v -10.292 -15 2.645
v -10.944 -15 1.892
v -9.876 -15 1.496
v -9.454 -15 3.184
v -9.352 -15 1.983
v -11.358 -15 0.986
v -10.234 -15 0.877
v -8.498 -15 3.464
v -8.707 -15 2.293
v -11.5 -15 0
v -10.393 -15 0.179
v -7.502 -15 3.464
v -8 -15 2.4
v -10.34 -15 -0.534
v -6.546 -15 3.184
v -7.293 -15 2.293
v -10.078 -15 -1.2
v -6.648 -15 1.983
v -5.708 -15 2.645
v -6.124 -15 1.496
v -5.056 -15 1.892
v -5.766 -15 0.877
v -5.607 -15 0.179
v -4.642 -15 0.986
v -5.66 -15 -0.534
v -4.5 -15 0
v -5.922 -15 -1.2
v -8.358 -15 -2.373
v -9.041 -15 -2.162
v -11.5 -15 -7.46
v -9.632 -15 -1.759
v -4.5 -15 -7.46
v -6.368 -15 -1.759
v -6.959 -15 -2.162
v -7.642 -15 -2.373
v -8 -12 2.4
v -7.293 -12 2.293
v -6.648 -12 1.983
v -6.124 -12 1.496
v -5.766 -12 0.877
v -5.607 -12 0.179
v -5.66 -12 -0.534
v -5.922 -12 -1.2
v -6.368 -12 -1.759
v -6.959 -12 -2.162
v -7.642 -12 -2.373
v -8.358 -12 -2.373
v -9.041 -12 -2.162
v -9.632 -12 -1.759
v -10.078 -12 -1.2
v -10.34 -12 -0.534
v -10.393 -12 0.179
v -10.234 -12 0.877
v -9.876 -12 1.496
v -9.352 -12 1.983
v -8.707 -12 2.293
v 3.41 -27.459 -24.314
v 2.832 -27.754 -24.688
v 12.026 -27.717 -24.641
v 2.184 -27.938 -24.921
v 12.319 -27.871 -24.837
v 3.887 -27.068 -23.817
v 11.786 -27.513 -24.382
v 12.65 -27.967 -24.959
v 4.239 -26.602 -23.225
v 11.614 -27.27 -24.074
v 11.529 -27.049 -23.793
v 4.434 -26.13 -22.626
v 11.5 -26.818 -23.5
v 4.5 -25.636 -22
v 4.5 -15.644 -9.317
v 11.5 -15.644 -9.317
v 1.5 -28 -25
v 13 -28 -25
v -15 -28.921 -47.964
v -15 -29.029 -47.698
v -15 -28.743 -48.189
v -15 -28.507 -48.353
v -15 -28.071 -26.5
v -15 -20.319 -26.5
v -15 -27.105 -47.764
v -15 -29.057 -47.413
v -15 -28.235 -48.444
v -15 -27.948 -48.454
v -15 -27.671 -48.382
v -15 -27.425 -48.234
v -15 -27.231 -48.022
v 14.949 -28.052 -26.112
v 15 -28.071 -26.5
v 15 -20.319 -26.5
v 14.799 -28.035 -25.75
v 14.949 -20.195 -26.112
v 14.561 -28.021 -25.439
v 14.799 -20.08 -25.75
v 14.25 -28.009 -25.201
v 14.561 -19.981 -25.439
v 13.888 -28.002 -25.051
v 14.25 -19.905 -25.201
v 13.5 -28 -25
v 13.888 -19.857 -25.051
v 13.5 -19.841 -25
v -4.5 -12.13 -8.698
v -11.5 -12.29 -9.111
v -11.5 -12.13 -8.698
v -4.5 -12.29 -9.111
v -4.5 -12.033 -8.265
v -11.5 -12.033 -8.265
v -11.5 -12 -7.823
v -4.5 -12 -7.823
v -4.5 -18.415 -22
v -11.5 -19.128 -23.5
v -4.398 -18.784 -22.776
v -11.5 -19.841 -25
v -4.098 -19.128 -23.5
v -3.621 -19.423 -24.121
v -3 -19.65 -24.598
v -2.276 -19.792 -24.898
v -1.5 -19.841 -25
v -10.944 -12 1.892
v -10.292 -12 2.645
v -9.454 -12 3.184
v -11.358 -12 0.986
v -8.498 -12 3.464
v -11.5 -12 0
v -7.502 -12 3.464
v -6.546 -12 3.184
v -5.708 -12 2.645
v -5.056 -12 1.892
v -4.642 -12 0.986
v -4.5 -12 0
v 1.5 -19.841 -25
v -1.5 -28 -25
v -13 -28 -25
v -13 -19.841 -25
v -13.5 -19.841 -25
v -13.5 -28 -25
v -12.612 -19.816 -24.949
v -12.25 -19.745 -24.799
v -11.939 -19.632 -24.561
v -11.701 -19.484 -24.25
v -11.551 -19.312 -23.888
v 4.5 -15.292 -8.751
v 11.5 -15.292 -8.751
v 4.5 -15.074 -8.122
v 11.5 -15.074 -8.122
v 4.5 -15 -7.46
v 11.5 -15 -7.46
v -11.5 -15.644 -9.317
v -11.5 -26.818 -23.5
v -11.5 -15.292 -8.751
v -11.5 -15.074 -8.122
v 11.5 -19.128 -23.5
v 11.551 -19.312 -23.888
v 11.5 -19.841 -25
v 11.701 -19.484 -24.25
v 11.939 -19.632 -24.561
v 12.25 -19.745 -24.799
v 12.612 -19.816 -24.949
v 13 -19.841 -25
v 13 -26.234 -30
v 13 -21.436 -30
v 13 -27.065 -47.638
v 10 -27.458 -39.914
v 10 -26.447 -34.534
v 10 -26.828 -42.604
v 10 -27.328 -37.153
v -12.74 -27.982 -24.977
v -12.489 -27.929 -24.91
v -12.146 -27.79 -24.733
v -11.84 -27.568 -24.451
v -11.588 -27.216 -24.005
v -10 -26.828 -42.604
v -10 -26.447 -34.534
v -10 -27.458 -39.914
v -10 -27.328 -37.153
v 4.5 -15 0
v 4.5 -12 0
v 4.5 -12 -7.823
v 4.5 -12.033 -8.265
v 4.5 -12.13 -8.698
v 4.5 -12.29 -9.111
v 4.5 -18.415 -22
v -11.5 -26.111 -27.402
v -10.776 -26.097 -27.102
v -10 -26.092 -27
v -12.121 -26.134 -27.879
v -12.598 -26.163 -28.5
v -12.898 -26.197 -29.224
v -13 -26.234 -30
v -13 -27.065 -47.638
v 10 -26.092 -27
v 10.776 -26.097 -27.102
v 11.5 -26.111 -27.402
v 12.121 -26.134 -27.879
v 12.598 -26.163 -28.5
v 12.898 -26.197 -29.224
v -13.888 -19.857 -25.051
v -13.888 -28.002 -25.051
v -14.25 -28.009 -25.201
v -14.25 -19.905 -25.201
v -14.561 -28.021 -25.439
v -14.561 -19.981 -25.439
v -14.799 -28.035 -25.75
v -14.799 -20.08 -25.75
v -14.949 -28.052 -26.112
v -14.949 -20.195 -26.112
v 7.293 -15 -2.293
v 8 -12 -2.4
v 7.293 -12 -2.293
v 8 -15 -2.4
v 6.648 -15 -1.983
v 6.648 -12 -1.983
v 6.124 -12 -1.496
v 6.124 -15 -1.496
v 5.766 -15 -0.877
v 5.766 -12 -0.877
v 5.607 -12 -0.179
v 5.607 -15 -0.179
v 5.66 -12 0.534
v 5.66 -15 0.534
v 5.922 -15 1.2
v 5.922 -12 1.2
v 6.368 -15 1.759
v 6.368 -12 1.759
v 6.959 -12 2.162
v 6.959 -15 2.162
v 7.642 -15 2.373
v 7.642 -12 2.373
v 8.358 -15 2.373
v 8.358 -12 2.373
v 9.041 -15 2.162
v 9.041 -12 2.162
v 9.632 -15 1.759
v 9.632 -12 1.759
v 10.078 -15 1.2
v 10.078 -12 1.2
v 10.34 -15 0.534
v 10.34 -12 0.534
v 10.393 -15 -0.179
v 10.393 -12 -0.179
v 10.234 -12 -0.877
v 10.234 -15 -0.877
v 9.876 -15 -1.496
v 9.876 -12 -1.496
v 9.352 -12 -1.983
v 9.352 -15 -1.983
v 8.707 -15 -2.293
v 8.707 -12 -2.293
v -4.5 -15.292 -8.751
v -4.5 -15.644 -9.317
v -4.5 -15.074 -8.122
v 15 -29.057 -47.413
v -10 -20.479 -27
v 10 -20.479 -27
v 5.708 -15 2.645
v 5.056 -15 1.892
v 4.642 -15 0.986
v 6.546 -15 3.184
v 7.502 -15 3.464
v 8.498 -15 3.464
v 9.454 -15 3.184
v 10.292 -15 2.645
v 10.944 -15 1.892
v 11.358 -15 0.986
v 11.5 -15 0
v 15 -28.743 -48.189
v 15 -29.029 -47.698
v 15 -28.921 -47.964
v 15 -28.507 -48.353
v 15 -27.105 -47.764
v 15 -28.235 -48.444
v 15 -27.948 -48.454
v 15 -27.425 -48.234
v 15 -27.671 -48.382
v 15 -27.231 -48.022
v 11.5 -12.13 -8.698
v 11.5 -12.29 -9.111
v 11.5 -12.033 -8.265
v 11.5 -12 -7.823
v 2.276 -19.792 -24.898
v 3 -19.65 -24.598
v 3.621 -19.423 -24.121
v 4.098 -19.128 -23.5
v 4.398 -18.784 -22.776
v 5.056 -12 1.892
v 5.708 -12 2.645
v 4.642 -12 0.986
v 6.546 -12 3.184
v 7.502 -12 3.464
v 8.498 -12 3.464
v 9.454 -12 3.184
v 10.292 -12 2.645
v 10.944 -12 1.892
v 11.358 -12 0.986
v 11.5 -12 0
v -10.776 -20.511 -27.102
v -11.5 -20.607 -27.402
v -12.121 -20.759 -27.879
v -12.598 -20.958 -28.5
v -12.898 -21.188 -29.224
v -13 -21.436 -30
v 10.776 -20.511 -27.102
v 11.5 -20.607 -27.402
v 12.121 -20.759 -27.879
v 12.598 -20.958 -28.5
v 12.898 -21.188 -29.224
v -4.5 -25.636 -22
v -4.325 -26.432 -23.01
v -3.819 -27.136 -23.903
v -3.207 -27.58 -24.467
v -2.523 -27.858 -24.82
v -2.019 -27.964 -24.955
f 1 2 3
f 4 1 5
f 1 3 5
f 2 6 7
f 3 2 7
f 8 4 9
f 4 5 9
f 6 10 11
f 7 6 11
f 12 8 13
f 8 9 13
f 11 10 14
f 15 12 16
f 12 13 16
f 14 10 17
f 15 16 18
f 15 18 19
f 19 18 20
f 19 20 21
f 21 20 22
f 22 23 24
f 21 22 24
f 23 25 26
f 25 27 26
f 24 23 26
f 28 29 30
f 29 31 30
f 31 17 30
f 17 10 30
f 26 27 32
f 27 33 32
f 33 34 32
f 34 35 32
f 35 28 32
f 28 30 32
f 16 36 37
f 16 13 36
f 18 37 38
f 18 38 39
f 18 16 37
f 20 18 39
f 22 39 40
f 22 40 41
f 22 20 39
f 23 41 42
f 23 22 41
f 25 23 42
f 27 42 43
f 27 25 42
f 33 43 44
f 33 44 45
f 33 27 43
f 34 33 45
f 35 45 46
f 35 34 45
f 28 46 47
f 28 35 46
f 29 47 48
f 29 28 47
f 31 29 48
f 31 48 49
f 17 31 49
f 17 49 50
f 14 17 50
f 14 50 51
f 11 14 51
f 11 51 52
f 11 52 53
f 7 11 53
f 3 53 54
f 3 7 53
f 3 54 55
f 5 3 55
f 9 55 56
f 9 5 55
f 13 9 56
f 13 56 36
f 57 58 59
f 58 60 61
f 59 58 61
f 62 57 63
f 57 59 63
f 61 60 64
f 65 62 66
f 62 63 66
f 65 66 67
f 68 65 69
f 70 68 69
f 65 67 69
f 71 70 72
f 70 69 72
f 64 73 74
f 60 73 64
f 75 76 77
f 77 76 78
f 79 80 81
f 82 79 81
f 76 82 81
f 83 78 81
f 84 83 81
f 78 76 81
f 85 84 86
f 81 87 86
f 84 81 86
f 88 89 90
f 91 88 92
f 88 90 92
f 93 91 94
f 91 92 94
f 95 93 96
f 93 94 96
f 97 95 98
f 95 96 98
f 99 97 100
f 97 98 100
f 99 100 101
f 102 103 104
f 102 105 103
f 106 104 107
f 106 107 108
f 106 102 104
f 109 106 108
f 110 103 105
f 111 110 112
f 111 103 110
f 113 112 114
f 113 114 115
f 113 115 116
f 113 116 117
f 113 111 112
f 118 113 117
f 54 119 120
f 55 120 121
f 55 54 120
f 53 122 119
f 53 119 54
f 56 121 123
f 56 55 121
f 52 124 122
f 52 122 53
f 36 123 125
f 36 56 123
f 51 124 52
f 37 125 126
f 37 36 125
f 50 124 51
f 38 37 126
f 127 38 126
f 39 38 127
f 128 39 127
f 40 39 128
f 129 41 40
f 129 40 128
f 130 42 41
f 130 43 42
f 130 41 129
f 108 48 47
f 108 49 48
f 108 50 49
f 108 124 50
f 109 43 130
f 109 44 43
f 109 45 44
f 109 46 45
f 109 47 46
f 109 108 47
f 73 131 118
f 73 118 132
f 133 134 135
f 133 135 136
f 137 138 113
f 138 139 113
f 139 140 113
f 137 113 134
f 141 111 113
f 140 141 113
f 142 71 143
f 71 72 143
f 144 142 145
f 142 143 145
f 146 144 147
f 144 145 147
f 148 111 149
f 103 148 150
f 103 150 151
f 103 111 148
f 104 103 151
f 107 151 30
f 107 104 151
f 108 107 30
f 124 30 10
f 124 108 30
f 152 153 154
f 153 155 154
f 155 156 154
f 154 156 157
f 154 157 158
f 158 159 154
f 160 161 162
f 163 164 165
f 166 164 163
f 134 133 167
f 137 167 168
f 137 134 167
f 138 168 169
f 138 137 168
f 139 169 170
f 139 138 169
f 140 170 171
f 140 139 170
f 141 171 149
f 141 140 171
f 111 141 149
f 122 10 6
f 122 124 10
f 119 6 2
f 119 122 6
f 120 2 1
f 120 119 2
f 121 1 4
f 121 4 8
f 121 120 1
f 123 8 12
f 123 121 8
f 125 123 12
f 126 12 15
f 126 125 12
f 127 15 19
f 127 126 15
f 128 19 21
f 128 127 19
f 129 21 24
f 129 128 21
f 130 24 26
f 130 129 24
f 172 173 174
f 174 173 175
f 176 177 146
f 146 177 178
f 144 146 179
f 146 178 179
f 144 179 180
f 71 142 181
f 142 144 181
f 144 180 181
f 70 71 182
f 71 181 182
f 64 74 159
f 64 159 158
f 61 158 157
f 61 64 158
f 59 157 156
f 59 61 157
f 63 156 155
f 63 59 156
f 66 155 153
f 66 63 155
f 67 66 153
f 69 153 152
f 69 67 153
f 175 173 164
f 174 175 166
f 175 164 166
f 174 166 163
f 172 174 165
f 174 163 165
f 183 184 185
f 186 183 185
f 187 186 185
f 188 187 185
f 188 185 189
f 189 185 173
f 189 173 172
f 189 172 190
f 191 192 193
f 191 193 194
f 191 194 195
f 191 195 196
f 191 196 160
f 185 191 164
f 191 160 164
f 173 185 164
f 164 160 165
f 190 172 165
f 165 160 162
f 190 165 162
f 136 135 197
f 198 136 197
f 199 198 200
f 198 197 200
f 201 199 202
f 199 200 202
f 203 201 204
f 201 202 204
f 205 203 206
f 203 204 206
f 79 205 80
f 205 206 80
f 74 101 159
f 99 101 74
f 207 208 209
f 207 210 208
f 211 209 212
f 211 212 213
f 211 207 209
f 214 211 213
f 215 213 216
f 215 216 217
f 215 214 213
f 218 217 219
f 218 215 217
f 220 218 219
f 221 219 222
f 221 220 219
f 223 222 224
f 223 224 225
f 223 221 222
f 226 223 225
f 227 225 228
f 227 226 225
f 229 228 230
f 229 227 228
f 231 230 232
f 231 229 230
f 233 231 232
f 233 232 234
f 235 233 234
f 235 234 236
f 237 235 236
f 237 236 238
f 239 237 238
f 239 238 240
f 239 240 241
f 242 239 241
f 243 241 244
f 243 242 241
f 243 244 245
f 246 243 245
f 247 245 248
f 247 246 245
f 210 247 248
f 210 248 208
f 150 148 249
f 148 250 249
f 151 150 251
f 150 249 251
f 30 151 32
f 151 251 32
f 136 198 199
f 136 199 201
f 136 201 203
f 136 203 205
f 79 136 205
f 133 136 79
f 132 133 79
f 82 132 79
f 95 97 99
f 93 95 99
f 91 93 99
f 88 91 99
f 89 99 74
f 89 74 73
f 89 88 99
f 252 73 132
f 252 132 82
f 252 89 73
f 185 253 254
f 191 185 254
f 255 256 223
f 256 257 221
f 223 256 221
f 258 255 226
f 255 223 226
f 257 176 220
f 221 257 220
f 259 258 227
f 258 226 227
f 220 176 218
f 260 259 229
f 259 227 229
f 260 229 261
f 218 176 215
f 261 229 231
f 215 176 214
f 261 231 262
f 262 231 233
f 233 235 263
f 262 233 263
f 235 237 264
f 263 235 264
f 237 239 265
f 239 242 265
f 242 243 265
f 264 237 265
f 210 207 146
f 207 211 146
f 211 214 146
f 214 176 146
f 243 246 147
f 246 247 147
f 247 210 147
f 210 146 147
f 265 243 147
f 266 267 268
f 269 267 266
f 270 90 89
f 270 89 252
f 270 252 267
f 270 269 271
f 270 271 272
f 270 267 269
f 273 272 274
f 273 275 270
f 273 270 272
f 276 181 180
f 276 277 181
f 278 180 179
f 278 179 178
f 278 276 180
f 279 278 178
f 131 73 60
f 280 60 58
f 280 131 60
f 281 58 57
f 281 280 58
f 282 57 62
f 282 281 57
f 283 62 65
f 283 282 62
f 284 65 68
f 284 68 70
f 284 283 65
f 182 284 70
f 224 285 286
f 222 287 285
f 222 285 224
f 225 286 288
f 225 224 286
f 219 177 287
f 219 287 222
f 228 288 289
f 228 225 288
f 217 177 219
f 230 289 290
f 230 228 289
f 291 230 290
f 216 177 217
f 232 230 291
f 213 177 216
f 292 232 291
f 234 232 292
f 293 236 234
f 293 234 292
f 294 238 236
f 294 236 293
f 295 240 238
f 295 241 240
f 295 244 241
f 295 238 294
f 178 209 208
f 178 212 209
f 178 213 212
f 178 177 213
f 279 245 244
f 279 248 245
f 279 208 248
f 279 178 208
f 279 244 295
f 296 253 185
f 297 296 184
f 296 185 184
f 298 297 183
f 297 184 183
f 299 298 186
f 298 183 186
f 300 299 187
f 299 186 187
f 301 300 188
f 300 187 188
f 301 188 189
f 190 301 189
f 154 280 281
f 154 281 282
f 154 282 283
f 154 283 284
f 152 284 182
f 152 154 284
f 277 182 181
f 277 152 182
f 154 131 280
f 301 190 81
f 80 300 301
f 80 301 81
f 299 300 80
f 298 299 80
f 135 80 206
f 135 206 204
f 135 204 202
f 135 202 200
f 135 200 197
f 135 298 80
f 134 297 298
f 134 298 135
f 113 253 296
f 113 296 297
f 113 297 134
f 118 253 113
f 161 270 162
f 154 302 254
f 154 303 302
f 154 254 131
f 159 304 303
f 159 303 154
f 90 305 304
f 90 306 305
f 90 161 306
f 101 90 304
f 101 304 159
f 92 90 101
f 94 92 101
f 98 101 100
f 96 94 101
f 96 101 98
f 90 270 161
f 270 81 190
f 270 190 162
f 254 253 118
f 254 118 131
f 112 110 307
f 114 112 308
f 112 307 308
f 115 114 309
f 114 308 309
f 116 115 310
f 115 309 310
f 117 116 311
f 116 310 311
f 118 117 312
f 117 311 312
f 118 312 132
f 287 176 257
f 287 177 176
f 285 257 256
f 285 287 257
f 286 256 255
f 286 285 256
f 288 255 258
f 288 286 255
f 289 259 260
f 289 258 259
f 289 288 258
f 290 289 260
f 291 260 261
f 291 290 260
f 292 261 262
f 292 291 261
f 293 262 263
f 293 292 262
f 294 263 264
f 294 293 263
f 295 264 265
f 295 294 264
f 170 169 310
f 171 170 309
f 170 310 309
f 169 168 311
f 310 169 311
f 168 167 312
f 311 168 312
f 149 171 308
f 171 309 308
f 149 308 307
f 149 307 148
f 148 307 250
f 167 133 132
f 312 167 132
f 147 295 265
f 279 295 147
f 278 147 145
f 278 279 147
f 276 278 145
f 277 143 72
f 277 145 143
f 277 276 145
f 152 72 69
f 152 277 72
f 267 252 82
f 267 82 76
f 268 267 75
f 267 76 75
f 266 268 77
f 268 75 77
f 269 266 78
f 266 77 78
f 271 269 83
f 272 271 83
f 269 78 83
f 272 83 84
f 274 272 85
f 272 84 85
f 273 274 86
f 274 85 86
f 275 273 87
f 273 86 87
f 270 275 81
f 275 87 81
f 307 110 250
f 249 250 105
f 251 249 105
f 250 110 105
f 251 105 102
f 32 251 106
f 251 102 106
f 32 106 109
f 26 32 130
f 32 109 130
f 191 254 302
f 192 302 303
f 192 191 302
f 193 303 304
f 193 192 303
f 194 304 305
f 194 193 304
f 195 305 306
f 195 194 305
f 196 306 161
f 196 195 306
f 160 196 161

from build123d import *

# Parameters (mm, degrees)
BOSS_EXTRUDE1_DEPTH   = 15
CUT_EXTRUDE1_REACH    = 66.15
SKETCH2_W             = 26
SKETCH2_H             = 30
SKETCH4_W             = 7
SKETCH4_H             = 12
SKETCH4_R             = 2.4
BOSS_EXTRUDE2_DEPTH   = 1.5
BOSS_EXTRUDE2_2_DEPTH = 1.5
BOSS_EXTRUDE3_DEPTH   = 7
BOSS_EXTRUDE4_DEPTH   = 7
FILLET1_R             = 3
FILLET2_R             = 1.5
FILLET3_R             = 1
FILLET4_RADIUS        = 3.5
FILLET4_LENGTH        = 3
FILLET5_RADIUS        = 3.5
FILLET5_LENGTH        = 3
SKETCH3_R             = 10
CUT_EXTRUDE2_DEPTH    = 10


with BuildPart() as part:
    # Sketch1 → Boss-Extrude1 (new, symmetric)
    with BuildSketch(Plane(origin=(0, 0, 0), x_dir=(0, 0, -1), z_dir=(1, 0, 0))):
        Polygon((25, -19.840542805), (25, -28), (55, -29.414764086), align=None)
    extrude(amount=BOSS_EXTRUDE1_DEPTH, both=True)

    # Cut-Extrude1: up to this plane
    cut_extrude1_end = Plane(origin=(0, -24.763733838, 1.167828043), z_dir=(0, -0.99888987496197, 0.0471064507096427))
    # Sketch2 → Cut-Extrude1 (cut, up to the surface)
    with BuildSketch(Plane(origin=(0, 0, 0), x_dir=(1, 0, 0), z_dir=(0, 1, 0)), mode=Mode.PRIVATE) as cut_extrude1_sk1:
        with Locations((0, 42)):
            Rectangle(SKETCH2_W, SKETCH2_H)
    cut_extrude1_tool1 = split(extrude(cut_extrude1_sk1.sketch, amount=-CUT_EXTRUDE1_REACH, mode=Mode.PRIVATE), bisect_by=cut_extrude1_end, keep=Keep.BOTH, mode=Mode.PRIVATE)
    add(cut_extrude1_tool1.solids().sort_by_distance((0, 0, -42))[0], mode=Mode.SUBTRACT)



with BuildPart() as body_2:
    # Sketch4 → Boss-Extrude2 (new, symmetric)
    with BuildSketch(Plane(origin=(0, -13.5, 0), x_dir=(1, 0, 0), z_dir=(0, 1, 0))):
        with Locations((8, 2.5)):
            Rectangle(SKETCH4_W, SKETCH4_H)
        with Locations(Location((8, 0, 0), (0, 0, 90))):
            Circle(SKETCH4_R, mode=Mode.SUBTRACT)
    extrude(amount=BOSS_EXTRUDE2_DEPTH, both=True)


with BuildPart() as body_3:
    # Sketch4 → Boss-Extrude2 2 (new, symmetric)
    with BuildSketch(Plane(origin=(0, -13.5, 0), x_dir=(1, 0, 0), z_dir=(0, 1, 0))):
        with Locations((-8, 2.5)):
            Rectangle(SKETCH4_W, SKETCH4_H)
        with Locations(Location((-8, 0, 0), (0, 0, 270))):
            Circle(SKETCH4_R, mode=Mode.SUBTRACT)
    extrude(amount=BOSS_EXTRUDE2_2_DEPTH, both=True)


with BuildPart() as part_1:
    add(part.part)

    add(body_2.part)  # Boss-Extrude3 merges body 2
    # Sketch5 → Boss-Extrude3 (add)
    with BuildSketch(Plane(origin=(11.5, 0, 0), x_dir=(0, 0, -1), z_dir=(1, 0, 0))):
        Polygon((8.5, -12), (8.5, -15), (25, -28), (25, -19.840542805), align=None)
    extrude(amount=-BOSS_EXTRUDE3_DEPTH)


    add(body_3.part)  # Boss-Extrude4 merges body 3
    # Sketch8 → Boss-Extrude4 (add)
    with BuildSketch(Plane.ZY.offset(11.5)):
        Polygon((-25, -28), (-8.5, -15), (-8.5, -12), (-25, -19.840542805), align=None)
    extrude(amount=-BOSS_EXTRUDE4_DEPTH)

    # Fillet1
    fillet1_edges = [part_1.edges().sort_by_distance(p)[0] for p in [
        (-8, -12, -8.5),
        (-4.5, -23.920271402, -25),
        (-13, -23.285459556, -27),
        (13, -23.285459556, -27),
        (8, -12, -8.5),
        (4.5, -23.920271402, -25),
        (8, -15, -8.5),
        (-8, -15, -8.5),
    ]]
    fillet(fillet1_edges, radius=FILLET1_R)

    # Fillet2
    # the kernel refuses this fillet: 1.5 mm, written as the material it adds along each edge
    with BuildSketch(Plane(origin=(-11.5, -16.090542805, -25), x_dir=(0, 0, 1), z_dir=(0, -1, 0))) as fillet2_piece_1_section:
        with BuildLine():
            CenterArc((FILLET2_R, FILLET2_R), FILLET2_R, 180, 90)
            Line((0, FILLET2_R), (0, 0))
            Line((0, 0), (FILLET2_R, 0))
        make_face()
    fillet2_piece_1 = extrude(amount=15.659457195, mode=Mode.PRIVATE)
    fillet2_piece_1 = split(fillet2_piece_1, bisect_by=Plane(origin=(-11.659708769, -19.629987495, -24.340243021), z_dir=(0, 0.9526614812535883, -0.30403306092548404)), keep=Keep.TOP, mode=Mode.PRIVATE)
    fillet2_piece_1 = split(fillet2_piece_1, bisect_by=Plane(origin=(-11.659708769, -19.543237279, -24.374336535), z_dir=(0, -0.9032129411473199, 0.4291927107302828)), keep=Keep.TOP, mode=Mode.PRIVATE)
    add(fillet2_piece_1)
    with BuildSketch(Plane(origin=(-11.5, -16.090542805, -25), x_dir=(0, 0, 1), z_dir=(0, -1, 0))) as fillet2_piece_2_section:
        with BuildLine():
            CenterArc((FILLET2_R, FILLET2_R), FILLET2_R, 180, 90)
            Line((0, FILLET2_R), (0, 0))
            Line((0, 0), (FILLET2_R, 0))
        make_face()
    fillet2_piece_2 = extrude(amount=15.659457195, mode=Mode.PRIVATE)
    fillet2_piece_2 = split(fillet2_piece_2, bisect_by=Plane(origin=(-11.843159529, -20.103961016, -25.825398338), z_dir=(0, -0.9526614812535883, 0.30403306092548404)), keep=Keep.TOP, mode=Mode.PRIVATE)
    fillet2_piece_2 = split(fillet2_piece_2, bisect_by=Plane(origin=(-11.843159529, -20.428696748, -26.237738291), z_dir=(0, -0.9032129411473199, 0.4291927107302828)), keep=Keep.TOP, mode=Mode.PRIVATE)
    fillet2_piece_2 = split(fillet2_piece_2, bisect_by=Plane(origin=(-11.843159529, -26.204484919, -22.721077013), z_dir=(0, 0.7854916722275349, -0.6188722266035137)), keep=Keep.TOP, mode=Mode.PRIVATE)
    fillet2_piece_2 = split(fillet2_piece_2, bisect_by=Plane(origin=(-11.843159529, -27.974843393, -24.466555432), z_dir=(0, 0.99888987496197, -0.04710645070964269)), keep=Keep.TOP, mode=Mode.PRIVATE)
    add(fillet2_piece_2)
    with BuildSketch(Plane(origin=(11.5, -31.75, -25), x_dir=(1, 0, 0), z_dir=(0, 1, 0))) as fillet2_piece_3_section:
        with BuildLine():
            CenterArc((FILLET2_R, -FILLET2_R), FILLET2_R, 90, 90)
            Line((0, -FILLET2_R), (0, 0))
            Line((0, 0), (FILLET2_R, 0))
        make_face()
    fillet2_piece_3 = extrude(amount=15.659457195, mode=Mode.PRIVATE)
    fillet2_piece_3 = split(fillet2_piece_3, bisect_by=Plane(origin=(11.843159529, -20.103961016, -25.825398338), z_dir=(0, -0.9526614812535883, 0.30403306092548404)), keep=Keep.TOP, mode=Mode.PRIVATE)
    fillet2_piece_3 = split(fillet2_piece_3, bisect_by=Plane(origin=(11.843159529, -27.974843393, -24.466555432), z_dir=(0, 0.99888987496197, -0.04710645070964269)), keep=Keep.TOP, mode=Mode.PRIVATE)
    fillet2_piece_3 = split(fillet2_piece_3, bisect_by=Plane(origin=(11.843159529, -26.204484919, -22.721077013), z_dir=(0, 0.7854916722275349, -0.6188722266035137)), keep=Keep.TOP, mode=Mode.PRIVATE)
    fillet2_piece_3 = split(fillet2_piece_3, bisect_by=Plane(origin=(11.843159529, -20.428696748, -26.237738291), z_dir=(0, -0.9032129411473199, 0.4291927107302828)), keep=Keep.TOP, mode=Mode.PRIVATE)
    add(fillet2_piece_3)
    with BuildSketch(Plane(origin=(11.5, -31.75, -25), x_dir=(1, 0, 0), z_dir=(0, 1, 0))) as fillet2_piece_4_section:
        with BuildLine():
            CenterArc((FILLET2_R, -FILLET2_R), FILLET2_R, 90, 90)
            Line((0, -FILLET2_R), (0, 0))
            Line((0, 0), (FILLET2_R, 0))
        make_face()
    fillet2_piece_4 = extrude(amount=15.659457195, mode=Mode.PRIVATE)
    fillet2_piece_4 = split(fillet2_piece_4, bisect_by=Plane(origin=(11.659708769, -19.629987495, -24.340243021), z_dir=(0, 0.9526614812535883, -0.30403306092548404)), keep=Keep.TOP, mode=Mode.PRIVATE)
    fillet2_piece_4 = split(fillet2_piece_4, bisect_by=Plane(origin=(11.659708769, -19.543237279, -24.374336535), z_dir=(0, -0.9032129411473199, 0.4291927107302828)), keep=Keep.TOP, mode=Mode.PRIVATE)
    add(fillet2_piece_4)
    # the kernel refuses this fillet: 1.5 mm, written as the material it takes off along each edge
    with BuildSketch(Plane(origin=(-15, -16.090542805, -25), x_dir=(1, 0, 0), z_dir=(0, -1, 0)), Plane(origin=(15, -16.090542805, -25), x_dir=(0, 0, -1), z_dir=(0, -1, 0))) as fillet2_2_piece_1:
        with BuildLine():
            CenterArc((FILLET2_R, -FILLET2_R), FILLET2_R, 90, 90)
            Line((0, -FILLET2_R), (0, 0))
            Line((0, 0), (FILLET2_R, 0))
        make_face()
    extrude(amount=15.659457195, mode=Mode.SUBTRACT)

    # Fillet3
    fillet3_edges = [part_1.edges().sort_by_distance(p)[0] for p in [
        (0, -29.414764086, -55),
    ]]
    fillet(fillet3_edges, radius=FILLET3_R)

    # Fillet4: full round fillet: the end face becomes a half cylinder, R = half its width
    fillet4_face = Plane((8, -13.5, 3.5), x_dir=(0, 1, 0), z_dir=(0, 0, 1))  # on the end face: x along it, z out of the body
    fillet4_slab = fillet4_face.offset(-FILLET4_RADIUS / 2) * Box(FILLET4_LENGTH, 2 * FILLET4_RADIUS, FILLET4_RADIUS, mode=Mode.PRIVATE)  # the body's end, R deep
    fillet4_round = Plane((8, -13.5, 0), x_dir=(0, 0, 1), z_dir=(0, 1, 0)) * Cylinder(FILLET4_RADIUS, FILLET4_LENGTH, mode=Mode.PRIVATE)  # its axis R under the face
    add(fillet4_slab - fillet4_round, mode=Mode.SUBTRACT)

    # Fillet5: full round fillet: the end face becomes a half cylinder, R = half its width
    fillet5_face = Plane((-8, -13.5, 3.5), x_dir=(0, 1, 0), z_dir=(0, 0, 1))  # on the end face: x along it, z out of the body
    fillet5_slab = fillet5_face.offset(-FILLET5_RADIUS / 2) * Box(FILLET5_LENGTH, 2 * FILLET5_RADIUS, FILLET5_RADIUS, mode=Mode.PRIVATE)  # the body's end, R deep
    fillet5_round = Plane((-8, -13.5, 0), x_dir=(0, 0, 1), z_dir=(0, 1, 0)) * Cylinder(FILLET5_RADIUS, FILLET5_LENGTH, mode=Mode.PRIVATE)  # its axis R under the face
    add(fillet5_slab - fillet5_round, mode=Mode.SUBTRACT)

    # Sketch3 → Cut-Extrude2 (cut, symmetric)
    with BuildSketch(Plane(origin=(0, 0, 0), x_dir=(0, 0, -1), z_dir=(1, 0, 0))):
        with Locations((39, -17.5)):
            Circle(SKETCH3_R)
    extrude(amount=CUT_EXTRUDE2_DEPTH, both=True, mode=Mode.SUBTRACT)


solid = part_1.part
